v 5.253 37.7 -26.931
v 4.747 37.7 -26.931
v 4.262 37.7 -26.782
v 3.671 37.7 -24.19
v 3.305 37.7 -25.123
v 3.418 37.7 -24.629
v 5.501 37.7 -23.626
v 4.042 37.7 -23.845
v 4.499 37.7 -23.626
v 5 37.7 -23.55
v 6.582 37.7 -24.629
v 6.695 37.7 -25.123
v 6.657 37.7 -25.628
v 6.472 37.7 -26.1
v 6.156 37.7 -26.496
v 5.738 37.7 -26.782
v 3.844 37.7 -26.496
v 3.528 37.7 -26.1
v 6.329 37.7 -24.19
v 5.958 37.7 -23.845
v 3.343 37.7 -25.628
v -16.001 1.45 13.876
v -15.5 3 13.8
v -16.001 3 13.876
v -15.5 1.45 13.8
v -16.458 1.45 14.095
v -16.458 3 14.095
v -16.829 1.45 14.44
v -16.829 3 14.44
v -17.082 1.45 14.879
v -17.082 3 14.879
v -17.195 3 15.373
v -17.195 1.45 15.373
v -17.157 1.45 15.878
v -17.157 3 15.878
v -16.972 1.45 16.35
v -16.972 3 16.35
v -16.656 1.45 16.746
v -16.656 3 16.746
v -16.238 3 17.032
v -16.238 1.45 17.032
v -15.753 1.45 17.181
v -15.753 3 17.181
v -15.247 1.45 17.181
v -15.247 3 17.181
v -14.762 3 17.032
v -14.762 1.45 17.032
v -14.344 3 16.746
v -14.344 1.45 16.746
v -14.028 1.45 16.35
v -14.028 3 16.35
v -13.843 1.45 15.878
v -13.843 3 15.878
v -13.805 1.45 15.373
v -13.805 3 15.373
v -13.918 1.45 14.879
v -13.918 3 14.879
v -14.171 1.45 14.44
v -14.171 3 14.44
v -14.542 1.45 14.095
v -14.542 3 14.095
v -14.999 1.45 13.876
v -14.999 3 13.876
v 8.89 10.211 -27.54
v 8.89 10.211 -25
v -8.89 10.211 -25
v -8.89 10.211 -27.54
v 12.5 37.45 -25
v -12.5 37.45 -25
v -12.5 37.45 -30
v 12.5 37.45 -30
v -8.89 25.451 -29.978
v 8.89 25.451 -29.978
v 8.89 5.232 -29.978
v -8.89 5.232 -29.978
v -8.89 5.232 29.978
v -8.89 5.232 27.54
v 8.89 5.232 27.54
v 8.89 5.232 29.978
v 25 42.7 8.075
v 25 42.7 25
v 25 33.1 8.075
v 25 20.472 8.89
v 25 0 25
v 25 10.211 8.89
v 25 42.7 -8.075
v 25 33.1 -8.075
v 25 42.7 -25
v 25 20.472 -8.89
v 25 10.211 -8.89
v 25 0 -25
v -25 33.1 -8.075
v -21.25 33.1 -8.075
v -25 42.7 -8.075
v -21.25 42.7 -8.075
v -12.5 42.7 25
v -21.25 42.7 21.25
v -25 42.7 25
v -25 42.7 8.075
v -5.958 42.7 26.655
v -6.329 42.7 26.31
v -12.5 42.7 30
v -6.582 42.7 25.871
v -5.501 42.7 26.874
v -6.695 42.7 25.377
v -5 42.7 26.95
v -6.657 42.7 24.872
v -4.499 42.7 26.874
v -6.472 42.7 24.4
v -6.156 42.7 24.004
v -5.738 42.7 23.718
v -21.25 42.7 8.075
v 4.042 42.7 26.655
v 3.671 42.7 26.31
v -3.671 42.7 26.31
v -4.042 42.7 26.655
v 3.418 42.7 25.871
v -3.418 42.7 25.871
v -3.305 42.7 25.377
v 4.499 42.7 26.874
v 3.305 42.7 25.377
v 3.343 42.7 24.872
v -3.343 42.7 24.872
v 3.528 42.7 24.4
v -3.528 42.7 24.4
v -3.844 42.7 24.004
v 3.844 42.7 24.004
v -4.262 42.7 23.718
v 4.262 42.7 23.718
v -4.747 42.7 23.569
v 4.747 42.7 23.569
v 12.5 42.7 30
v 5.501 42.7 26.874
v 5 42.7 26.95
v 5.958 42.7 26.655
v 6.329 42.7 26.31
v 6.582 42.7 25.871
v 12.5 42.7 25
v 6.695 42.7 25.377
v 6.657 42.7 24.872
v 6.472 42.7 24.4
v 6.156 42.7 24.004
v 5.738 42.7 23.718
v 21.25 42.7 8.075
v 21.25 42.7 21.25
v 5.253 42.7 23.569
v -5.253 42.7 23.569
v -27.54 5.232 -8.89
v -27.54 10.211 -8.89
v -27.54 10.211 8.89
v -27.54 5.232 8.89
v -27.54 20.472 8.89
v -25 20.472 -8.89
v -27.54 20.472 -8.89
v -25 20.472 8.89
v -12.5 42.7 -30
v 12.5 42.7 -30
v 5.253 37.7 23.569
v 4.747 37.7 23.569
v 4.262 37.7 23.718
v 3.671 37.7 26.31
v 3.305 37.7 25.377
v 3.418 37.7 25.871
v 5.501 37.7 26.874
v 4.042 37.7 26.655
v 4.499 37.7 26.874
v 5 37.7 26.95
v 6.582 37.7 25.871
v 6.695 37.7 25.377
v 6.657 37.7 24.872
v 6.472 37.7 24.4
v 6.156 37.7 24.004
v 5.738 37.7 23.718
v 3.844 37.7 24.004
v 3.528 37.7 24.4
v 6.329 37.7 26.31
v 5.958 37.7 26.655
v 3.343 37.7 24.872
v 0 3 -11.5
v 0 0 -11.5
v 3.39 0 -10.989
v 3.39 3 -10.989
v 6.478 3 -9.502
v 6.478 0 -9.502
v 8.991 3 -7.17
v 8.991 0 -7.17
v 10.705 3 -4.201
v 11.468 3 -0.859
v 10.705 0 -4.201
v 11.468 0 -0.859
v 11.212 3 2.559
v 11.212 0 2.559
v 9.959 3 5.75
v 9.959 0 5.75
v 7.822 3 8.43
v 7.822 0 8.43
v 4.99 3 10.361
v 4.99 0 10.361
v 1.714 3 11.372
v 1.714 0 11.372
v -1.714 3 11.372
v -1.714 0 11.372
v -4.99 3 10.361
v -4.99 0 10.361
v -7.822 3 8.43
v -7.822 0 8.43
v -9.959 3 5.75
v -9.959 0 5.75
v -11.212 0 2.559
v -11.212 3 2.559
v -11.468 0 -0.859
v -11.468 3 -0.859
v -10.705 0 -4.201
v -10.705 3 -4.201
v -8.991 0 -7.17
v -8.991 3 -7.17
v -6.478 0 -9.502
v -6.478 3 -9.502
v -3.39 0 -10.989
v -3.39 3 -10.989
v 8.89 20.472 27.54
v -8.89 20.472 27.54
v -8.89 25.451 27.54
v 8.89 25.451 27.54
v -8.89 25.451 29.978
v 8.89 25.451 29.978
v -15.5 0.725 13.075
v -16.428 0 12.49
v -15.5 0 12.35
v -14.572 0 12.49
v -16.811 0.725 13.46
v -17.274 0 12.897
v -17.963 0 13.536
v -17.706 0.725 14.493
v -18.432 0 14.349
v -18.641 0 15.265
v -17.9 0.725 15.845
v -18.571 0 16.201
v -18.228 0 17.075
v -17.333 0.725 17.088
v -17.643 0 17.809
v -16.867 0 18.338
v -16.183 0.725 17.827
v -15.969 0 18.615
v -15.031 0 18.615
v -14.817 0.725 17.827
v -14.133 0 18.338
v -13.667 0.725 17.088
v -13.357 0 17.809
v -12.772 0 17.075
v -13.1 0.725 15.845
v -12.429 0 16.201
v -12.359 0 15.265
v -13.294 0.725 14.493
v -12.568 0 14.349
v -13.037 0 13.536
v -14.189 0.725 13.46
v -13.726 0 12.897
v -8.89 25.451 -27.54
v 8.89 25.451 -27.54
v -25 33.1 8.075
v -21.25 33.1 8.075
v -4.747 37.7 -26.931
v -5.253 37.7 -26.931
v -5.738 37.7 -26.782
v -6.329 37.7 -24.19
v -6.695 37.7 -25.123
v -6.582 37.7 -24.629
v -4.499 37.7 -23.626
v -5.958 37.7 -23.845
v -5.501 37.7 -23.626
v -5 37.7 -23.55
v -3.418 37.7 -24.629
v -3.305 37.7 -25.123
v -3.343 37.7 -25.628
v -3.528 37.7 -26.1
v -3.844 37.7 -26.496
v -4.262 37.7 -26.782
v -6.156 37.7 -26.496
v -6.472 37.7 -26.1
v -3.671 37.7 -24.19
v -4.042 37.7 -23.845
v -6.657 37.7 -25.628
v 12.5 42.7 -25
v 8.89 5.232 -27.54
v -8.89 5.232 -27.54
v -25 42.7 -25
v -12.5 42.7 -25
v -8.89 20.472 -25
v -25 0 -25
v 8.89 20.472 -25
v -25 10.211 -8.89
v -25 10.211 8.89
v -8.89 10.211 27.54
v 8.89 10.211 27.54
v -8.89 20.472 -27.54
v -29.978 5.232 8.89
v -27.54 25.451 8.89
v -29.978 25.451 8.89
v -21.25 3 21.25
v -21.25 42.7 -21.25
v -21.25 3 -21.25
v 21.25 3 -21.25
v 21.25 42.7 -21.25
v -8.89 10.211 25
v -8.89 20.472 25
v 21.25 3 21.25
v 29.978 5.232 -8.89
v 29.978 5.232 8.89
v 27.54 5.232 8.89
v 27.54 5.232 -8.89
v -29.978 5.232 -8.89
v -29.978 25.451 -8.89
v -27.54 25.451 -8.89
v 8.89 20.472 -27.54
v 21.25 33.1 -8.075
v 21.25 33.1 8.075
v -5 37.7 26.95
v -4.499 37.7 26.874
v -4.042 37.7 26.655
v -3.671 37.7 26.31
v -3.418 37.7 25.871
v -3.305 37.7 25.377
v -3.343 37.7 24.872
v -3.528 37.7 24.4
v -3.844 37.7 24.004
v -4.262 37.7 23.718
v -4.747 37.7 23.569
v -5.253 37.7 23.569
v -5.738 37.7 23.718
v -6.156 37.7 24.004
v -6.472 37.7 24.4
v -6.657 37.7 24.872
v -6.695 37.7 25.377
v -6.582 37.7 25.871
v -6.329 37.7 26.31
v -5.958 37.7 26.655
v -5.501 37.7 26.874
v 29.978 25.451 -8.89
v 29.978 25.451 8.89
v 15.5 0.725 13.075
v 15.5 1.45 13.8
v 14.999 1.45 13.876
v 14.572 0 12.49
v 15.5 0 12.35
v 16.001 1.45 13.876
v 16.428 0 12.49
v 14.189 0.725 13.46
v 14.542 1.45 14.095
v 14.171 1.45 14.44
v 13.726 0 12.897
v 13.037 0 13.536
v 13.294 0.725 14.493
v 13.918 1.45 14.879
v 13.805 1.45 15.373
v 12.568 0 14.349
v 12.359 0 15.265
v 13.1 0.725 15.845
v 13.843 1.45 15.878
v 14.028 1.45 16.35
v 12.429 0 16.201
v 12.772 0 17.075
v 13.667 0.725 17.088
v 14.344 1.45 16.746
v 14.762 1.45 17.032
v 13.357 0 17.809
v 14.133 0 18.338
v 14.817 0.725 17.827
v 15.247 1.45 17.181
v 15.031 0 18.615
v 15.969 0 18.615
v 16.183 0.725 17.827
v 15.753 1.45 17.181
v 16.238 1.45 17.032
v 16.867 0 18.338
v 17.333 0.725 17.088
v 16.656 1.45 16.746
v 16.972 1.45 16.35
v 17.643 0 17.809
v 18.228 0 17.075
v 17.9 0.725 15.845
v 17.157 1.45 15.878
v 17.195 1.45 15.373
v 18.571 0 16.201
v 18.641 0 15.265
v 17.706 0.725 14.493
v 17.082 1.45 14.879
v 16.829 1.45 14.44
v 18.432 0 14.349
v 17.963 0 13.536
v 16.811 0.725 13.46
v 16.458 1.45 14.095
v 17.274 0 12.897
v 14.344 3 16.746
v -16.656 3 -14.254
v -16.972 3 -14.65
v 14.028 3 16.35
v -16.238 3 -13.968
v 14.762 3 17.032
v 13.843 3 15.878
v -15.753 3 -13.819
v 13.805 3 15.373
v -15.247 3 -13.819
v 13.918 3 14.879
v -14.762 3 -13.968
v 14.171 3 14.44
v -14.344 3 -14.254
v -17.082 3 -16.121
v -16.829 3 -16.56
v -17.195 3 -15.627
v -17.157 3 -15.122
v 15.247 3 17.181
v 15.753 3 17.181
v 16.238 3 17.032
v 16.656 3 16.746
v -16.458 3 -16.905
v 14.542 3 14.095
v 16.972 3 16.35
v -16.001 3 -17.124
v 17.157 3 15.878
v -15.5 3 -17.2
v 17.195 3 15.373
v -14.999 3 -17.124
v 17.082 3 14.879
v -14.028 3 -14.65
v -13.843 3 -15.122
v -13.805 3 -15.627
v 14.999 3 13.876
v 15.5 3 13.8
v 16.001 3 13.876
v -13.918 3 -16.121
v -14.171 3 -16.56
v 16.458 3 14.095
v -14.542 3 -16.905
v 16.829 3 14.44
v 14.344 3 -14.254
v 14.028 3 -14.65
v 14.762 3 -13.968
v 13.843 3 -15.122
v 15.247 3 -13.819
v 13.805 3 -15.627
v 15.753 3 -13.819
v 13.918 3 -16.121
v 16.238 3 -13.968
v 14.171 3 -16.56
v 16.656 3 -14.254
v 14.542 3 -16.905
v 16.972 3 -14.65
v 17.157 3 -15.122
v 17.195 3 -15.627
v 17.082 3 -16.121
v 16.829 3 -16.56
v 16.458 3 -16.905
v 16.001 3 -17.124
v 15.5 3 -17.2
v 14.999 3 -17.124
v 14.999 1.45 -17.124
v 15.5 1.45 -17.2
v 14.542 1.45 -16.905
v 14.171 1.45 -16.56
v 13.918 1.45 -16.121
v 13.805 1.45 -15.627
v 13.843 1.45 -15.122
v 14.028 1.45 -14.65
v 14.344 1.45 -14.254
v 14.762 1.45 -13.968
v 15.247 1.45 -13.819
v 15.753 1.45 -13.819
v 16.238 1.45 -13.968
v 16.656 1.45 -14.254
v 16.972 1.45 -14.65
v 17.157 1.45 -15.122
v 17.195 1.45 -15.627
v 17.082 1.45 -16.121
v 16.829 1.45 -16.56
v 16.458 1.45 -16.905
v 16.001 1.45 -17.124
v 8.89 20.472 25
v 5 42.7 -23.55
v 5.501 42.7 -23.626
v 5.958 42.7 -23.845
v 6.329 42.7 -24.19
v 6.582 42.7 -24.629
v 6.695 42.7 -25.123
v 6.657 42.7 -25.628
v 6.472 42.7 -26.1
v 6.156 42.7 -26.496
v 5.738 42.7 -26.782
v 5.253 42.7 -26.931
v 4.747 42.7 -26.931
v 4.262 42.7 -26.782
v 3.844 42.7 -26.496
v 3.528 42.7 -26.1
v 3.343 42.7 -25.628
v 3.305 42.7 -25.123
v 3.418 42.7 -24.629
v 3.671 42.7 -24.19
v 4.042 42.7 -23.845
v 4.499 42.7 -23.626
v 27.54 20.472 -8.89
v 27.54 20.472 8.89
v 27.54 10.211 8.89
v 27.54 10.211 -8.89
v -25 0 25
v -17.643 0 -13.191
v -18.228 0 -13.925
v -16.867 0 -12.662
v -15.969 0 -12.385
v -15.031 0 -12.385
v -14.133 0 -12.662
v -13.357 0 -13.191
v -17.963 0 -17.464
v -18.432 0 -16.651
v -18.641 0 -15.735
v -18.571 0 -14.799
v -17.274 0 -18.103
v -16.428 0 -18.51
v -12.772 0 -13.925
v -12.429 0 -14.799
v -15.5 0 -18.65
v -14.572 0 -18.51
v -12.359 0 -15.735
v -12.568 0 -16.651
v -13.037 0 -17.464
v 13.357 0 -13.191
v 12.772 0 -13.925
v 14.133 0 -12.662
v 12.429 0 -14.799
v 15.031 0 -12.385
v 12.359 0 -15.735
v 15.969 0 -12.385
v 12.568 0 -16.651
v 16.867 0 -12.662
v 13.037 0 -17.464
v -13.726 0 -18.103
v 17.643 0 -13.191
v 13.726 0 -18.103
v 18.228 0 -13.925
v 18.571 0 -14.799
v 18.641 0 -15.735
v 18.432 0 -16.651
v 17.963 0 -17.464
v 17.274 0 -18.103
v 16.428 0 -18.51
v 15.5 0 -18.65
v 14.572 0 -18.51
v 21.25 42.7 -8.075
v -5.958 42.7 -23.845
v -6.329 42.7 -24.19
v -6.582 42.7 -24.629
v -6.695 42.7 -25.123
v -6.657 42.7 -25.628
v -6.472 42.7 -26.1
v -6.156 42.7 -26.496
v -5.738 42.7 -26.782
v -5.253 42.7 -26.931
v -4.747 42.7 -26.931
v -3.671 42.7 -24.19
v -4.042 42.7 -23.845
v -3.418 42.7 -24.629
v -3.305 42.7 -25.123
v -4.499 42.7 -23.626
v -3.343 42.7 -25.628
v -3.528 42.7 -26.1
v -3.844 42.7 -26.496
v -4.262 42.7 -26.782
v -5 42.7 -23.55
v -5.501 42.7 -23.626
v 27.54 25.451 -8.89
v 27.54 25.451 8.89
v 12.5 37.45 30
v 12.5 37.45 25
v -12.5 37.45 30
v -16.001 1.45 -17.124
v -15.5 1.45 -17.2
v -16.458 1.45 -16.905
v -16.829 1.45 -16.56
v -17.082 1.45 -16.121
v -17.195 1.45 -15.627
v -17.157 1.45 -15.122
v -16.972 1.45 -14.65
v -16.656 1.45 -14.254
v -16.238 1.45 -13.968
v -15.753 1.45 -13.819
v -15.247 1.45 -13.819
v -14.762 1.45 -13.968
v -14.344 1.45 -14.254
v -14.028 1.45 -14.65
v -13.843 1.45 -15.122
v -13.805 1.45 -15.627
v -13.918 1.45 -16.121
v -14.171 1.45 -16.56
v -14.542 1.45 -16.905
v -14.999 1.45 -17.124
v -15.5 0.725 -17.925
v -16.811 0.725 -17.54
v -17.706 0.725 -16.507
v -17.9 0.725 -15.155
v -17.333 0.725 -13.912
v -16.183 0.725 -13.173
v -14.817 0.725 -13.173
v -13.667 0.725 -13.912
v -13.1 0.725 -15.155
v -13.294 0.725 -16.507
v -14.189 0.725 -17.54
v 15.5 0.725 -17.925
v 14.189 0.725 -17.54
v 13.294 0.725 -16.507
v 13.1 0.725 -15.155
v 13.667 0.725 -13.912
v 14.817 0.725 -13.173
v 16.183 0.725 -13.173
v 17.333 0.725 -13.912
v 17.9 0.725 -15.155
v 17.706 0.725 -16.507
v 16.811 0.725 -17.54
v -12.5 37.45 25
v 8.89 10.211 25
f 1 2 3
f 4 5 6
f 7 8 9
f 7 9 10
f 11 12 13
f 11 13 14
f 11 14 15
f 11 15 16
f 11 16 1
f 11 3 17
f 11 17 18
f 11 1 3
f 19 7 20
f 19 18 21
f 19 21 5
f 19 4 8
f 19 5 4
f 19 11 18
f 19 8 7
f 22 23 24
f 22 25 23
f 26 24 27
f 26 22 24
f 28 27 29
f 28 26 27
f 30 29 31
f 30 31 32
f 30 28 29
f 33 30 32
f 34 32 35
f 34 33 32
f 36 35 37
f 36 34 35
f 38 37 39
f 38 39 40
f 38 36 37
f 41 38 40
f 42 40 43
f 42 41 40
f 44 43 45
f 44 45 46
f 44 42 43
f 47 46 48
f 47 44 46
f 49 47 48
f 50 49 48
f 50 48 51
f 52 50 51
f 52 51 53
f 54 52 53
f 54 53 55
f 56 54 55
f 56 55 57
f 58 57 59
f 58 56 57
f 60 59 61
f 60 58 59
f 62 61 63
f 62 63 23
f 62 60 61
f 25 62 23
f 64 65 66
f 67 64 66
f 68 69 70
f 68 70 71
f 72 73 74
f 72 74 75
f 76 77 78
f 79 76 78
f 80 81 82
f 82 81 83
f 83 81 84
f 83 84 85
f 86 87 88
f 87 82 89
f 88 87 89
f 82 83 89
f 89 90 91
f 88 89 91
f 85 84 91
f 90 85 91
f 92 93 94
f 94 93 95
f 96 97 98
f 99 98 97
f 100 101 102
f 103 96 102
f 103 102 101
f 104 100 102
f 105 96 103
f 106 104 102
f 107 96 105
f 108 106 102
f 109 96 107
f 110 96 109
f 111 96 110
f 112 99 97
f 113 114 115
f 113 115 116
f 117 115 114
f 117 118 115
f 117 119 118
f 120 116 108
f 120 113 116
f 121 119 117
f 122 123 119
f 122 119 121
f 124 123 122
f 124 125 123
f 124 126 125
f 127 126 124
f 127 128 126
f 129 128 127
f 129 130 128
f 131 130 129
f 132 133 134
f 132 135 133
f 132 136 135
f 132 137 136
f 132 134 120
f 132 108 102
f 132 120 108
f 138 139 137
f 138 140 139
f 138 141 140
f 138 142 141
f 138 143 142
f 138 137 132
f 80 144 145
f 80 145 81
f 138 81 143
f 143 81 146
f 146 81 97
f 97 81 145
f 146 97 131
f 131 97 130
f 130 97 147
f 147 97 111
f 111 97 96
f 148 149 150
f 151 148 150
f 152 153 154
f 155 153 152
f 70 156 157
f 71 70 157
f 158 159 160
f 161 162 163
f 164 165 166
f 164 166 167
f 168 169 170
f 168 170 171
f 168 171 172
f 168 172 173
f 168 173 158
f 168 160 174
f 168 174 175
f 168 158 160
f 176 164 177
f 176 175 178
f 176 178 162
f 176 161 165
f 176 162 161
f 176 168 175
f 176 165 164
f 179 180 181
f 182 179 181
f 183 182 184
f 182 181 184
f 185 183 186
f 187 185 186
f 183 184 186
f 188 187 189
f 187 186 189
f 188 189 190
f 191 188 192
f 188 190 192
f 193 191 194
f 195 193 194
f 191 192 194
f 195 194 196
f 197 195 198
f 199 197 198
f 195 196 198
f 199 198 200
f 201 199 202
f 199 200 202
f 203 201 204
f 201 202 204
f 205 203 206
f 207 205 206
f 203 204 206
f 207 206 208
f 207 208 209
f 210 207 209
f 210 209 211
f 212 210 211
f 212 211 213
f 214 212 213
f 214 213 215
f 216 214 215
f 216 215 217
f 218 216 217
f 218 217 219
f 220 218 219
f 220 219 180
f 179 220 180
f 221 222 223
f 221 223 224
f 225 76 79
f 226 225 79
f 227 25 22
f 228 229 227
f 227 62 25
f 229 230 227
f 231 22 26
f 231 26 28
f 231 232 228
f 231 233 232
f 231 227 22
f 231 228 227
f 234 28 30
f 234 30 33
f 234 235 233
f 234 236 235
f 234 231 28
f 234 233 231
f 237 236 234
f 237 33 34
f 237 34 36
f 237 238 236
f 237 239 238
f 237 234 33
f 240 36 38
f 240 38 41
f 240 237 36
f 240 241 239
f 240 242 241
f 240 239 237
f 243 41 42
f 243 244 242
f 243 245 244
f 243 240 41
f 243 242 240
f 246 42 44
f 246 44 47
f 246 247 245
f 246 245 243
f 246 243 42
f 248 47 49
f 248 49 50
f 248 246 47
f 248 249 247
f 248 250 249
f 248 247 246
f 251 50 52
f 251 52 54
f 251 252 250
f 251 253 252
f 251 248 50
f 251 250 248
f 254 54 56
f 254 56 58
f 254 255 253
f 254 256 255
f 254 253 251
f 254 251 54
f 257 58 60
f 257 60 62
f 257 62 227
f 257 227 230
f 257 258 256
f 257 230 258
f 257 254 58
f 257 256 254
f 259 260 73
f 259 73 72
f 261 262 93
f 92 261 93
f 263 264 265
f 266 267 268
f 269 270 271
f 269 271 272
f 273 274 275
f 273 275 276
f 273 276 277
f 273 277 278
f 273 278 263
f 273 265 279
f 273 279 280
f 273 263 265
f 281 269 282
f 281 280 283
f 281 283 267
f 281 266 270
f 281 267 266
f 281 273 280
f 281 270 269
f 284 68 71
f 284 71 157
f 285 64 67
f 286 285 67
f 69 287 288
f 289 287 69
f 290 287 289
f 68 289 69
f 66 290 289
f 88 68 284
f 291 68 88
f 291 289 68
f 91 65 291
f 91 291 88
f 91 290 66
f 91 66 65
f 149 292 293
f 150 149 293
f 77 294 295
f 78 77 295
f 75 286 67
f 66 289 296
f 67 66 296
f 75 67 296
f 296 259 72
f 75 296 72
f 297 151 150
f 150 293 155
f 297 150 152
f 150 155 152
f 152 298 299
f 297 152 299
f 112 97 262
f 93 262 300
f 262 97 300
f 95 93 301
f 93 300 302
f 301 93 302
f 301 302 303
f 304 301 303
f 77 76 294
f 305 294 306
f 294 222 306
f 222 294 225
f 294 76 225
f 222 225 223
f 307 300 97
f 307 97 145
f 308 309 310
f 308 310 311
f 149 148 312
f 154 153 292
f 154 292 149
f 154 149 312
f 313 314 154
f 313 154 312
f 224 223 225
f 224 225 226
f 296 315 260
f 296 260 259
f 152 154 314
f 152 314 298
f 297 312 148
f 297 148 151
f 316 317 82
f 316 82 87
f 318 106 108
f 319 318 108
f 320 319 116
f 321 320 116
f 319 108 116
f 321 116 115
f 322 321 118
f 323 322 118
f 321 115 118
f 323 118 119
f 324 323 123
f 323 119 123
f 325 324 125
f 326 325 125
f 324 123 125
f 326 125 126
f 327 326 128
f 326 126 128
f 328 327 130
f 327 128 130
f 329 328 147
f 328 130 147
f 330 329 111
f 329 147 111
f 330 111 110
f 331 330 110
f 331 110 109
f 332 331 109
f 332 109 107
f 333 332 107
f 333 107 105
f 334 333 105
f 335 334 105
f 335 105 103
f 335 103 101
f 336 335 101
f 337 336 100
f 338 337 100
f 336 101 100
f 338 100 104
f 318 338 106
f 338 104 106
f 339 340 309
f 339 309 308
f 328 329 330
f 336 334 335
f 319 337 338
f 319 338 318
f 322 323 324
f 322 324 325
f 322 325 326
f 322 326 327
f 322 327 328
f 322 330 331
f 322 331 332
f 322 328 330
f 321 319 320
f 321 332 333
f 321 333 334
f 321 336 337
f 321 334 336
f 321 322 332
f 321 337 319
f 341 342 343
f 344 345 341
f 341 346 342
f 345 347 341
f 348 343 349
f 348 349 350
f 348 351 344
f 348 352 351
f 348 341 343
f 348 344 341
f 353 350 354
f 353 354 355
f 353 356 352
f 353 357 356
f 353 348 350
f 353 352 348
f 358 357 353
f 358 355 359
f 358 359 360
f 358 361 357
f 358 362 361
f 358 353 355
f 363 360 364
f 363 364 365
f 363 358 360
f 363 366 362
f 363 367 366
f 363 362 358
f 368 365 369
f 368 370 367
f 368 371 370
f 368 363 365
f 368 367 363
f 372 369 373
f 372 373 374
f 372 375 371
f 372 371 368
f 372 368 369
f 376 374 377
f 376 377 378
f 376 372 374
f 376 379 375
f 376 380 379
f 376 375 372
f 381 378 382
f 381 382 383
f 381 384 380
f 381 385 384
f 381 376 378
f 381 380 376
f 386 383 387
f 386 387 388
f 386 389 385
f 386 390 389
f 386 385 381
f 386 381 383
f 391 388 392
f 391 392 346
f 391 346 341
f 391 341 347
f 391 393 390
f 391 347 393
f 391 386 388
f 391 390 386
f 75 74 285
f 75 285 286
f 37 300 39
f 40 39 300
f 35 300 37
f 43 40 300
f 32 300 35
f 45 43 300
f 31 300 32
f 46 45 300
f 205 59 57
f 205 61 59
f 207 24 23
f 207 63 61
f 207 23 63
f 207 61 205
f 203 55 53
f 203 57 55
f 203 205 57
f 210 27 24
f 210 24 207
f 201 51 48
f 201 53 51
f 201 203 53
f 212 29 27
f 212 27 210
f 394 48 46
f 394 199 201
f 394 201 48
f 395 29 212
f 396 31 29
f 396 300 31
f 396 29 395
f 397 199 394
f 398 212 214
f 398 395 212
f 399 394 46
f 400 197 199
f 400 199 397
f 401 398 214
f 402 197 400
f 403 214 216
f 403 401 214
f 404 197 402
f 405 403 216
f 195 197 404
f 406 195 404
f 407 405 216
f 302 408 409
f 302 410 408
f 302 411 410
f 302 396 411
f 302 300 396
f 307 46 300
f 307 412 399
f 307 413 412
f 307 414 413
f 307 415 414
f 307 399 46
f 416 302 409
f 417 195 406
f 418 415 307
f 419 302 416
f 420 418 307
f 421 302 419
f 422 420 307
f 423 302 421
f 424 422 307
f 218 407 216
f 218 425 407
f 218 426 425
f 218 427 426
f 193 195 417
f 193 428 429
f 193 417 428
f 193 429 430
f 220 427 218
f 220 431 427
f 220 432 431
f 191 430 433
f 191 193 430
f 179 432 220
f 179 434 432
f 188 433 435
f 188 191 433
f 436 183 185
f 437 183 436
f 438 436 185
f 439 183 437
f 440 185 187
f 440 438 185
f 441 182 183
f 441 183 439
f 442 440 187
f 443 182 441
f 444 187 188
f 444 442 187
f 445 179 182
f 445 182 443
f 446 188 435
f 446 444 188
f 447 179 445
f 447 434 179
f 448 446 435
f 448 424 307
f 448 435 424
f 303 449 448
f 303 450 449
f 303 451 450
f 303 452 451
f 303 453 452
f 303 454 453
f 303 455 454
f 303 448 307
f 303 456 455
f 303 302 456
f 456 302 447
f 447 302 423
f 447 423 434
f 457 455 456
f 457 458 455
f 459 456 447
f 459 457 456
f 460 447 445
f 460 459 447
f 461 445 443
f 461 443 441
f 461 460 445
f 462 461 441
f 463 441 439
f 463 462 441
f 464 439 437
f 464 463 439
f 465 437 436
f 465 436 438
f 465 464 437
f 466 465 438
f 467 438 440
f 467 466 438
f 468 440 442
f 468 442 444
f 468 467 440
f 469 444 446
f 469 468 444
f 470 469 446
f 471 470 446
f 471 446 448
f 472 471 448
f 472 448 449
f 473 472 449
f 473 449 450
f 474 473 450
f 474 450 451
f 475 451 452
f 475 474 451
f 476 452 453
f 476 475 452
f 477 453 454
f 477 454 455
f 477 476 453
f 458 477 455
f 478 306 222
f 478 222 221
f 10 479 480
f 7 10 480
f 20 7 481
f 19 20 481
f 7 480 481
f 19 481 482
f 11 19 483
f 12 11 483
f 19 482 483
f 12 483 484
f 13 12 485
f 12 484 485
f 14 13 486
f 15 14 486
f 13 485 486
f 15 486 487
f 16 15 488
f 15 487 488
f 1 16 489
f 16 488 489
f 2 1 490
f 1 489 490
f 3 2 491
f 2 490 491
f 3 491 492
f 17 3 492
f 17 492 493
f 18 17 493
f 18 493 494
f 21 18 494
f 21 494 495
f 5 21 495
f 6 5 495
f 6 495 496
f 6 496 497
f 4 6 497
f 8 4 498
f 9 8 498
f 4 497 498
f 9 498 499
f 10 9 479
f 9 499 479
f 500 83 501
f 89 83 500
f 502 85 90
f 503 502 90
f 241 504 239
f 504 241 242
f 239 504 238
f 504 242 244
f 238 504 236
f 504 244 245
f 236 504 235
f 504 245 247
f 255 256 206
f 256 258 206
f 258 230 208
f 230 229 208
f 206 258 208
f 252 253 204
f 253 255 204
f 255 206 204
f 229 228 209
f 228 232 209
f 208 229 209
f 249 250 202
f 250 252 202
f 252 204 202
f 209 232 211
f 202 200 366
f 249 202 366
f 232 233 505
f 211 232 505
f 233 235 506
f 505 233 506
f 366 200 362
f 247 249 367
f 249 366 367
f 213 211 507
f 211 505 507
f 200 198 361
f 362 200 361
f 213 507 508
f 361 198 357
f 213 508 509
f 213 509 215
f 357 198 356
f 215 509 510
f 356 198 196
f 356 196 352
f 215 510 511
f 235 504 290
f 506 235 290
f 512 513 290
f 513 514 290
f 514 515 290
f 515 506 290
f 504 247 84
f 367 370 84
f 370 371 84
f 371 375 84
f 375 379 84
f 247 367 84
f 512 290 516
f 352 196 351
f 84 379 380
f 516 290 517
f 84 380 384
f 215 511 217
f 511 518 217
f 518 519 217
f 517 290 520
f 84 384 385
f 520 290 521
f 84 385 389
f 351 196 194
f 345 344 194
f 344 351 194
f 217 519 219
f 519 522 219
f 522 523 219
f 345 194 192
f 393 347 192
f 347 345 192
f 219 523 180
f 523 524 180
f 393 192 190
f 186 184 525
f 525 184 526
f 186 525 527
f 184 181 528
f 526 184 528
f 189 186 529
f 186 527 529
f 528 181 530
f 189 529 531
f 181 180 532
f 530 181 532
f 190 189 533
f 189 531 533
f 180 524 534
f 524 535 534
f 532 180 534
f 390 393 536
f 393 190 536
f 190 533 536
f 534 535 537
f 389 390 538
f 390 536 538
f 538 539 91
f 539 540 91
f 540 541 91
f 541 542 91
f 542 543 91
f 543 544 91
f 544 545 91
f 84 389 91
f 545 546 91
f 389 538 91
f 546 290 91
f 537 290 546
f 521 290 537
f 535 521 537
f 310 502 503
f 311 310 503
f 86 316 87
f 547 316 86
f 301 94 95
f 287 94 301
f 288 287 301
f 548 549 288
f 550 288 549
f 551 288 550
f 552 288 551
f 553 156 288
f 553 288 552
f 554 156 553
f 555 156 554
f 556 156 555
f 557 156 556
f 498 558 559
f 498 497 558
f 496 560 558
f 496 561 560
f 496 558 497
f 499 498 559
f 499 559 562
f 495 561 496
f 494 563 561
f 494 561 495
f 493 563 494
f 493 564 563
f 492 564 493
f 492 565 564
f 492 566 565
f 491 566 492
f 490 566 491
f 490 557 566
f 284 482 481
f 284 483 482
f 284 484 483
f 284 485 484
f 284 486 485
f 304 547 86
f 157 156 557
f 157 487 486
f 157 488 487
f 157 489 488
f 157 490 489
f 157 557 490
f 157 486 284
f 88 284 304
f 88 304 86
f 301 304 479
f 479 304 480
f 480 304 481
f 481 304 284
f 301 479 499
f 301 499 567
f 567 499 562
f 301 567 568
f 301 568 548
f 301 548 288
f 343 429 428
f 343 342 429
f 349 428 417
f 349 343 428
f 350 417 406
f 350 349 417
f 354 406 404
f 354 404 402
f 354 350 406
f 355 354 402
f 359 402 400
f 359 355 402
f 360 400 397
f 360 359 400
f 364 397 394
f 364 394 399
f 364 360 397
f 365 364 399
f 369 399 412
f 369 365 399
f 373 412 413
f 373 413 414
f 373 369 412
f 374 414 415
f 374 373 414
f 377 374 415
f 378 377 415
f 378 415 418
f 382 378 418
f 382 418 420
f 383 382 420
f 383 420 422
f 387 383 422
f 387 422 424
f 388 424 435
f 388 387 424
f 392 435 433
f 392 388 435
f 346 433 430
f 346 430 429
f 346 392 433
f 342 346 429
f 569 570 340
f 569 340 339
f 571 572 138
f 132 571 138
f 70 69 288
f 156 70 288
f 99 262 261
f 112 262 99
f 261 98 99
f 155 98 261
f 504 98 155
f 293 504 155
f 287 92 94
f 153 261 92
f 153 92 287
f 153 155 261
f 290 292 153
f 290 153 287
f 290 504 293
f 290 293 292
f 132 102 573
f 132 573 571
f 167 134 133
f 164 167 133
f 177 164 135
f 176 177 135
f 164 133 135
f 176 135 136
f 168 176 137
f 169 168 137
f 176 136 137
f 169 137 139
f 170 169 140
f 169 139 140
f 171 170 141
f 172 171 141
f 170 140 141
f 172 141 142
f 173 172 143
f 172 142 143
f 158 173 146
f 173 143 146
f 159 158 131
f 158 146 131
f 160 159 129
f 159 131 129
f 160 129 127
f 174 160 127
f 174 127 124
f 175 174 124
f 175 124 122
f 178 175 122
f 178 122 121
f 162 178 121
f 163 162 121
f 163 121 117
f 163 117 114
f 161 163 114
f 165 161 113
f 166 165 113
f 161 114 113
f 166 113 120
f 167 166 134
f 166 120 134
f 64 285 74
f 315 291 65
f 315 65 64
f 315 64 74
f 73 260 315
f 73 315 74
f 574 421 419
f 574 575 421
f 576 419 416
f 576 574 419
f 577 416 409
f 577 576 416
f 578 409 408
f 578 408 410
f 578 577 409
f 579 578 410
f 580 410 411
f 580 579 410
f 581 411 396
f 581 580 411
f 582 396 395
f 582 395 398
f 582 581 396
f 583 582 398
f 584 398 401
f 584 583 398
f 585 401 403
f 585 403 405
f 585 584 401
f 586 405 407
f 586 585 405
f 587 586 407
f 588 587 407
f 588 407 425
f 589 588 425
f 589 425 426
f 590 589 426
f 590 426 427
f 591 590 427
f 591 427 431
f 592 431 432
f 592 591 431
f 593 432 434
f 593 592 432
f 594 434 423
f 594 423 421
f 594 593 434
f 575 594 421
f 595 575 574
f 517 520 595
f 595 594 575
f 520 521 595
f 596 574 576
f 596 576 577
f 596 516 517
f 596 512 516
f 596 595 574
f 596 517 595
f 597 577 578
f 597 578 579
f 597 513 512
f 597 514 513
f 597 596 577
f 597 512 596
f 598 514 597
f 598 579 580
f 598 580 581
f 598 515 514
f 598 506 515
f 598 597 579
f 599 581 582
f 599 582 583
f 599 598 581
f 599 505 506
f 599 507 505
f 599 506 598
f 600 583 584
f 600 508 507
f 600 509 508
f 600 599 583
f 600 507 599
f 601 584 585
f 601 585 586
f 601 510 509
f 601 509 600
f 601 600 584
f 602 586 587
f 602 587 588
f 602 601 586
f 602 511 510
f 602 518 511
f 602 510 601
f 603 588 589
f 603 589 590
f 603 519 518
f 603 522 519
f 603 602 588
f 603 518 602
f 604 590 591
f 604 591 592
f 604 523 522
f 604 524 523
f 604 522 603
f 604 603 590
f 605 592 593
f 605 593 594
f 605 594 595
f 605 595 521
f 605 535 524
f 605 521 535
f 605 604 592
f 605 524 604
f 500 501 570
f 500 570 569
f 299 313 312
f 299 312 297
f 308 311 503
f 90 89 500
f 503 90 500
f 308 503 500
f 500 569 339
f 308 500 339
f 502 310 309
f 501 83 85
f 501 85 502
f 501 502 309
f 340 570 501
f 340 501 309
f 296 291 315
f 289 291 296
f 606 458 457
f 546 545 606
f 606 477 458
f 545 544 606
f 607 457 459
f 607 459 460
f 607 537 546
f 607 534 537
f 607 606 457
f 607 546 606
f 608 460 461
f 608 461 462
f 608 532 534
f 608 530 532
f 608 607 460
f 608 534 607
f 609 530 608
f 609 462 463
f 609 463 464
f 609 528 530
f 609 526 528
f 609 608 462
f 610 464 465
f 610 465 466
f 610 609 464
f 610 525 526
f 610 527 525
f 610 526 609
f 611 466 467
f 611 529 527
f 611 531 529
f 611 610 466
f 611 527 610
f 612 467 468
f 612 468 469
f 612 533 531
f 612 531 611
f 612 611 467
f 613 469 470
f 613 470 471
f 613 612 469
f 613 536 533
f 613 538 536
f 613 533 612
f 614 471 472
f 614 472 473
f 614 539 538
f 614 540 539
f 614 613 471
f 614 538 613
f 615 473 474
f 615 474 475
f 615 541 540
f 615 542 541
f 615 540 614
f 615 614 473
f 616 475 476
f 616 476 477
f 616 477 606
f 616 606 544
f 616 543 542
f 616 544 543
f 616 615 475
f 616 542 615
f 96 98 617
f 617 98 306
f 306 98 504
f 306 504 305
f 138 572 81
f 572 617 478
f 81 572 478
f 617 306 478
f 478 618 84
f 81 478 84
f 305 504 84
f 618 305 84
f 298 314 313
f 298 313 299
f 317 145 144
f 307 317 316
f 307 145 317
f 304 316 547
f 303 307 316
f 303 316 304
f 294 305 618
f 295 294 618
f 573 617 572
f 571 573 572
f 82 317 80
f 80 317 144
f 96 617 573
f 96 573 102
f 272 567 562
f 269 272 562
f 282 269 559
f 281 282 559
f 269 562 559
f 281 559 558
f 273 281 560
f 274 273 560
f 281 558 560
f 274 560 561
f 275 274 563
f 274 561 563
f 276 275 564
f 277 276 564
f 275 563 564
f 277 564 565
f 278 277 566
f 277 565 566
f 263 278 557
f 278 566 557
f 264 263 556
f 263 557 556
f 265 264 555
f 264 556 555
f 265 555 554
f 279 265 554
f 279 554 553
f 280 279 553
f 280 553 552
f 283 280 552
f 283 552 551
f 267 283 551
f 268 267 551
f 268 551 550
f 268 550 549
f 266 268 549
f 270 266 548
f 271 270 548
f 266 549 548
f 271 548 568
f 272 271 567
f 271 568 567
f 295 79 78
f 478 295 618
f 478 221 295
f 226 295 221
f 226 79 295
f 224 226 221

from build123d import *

# Parameters (mm, degrees)
SKETCH1_W                                    = 50
SKETCH1_H                                    = 50
BOSS_EXTRUDE1_DEPTH                          = 3
SKETCH3_W                                    = 50
SKETCH3_H                                    = 50
SKETCH3_W_2                                  = 42.5
SKETCH3_H_2                                  = 42.5
BOSS_EXTRUDE2_DEPTH                          = 39.7
CUT_EXTRUDE5_START                           = -5
SKETCH19_W                                   = 16.15
SKETCH19_H                                   = 9.6
CUT_EXTRUDE5_DEPTH                           = 76.344082907
SKETCH33_W                                   = 25
SKETCH33_H                                   = 5.25
BOSS_EXTRUDE14_DEPTH                         = 5
SKETCH21_R                                   = 1.7
CUT_EXTRUDE6_DEPTH                           = 5
CUT_EXTRUDE8_REACH                           = 59.864
SKETCH27_R                                   = 11.5
CSK_FOR_M3_COUNTERSUNK_FLAT_HEAD_SCR_2_COUNT = 2
CSK_FOR_M3_COUNTERSUNK_FLAT_HEAD_SCR_2_PITCH = 31
CSK_FOR_M3_COUNTERSUNK_FLAT_HEAD_SCR_3_COUNT = 2
CSK_FOR_M3_COUNTERSUNK_FLAT_HEAD_SCR_3_PITCH = 43.840620434
CSK_FOR_M3_COUNTERSUNK_FLAT_HEAD_SCR_4_COUNT = 2
CSK_FOR_M3_COUNTERSUNK_FLAT_HEAD_SCR_4_PITCH = 31
SKETCH34_W                                   = 17.78
SKETCH34_H                                   = 10.2616
BOSS_EXTRUDE15_DEPTH                         = 4.9784
SKETCH35_W                                   = 17.78
SKETCH35_H                                   = 2.4384
BOSS_EXTRUDE16_DEPTH                         = 4.9784
CIRPATTERN1_COUNT                            = 4
CIRPATTERN1_COPY_1_SKETCH_W                  = 17.78
CIRPATTERN1_COPY_1_SKETCH_H                  = 2.4384
CIRPATTERN1_COPY_1_DEPTH                     = 4.9784
CIRPATTERN1_COPY_2_SKETCH_W                  = 17.78
CIRPATTERN1_COPY_2_SKETCH_H                  = 2.4384
CIRPATTERN1_COPY_2_DEPTH                     = 4.9784
CIRPATTERN1_COPY_3_SKETCH_W                  = 17.78
CIRPATTERN1_COPY_3_SKETCH_H                  = 2.4384
CIRPATTERN1_COPY_3_DEPTH                     = 4.9784


with BuildPart() as part:
    # Sketch1 → Boss-Extrude1 (new body)
    with BuildSketch(Plane(origin=(0, 0, 0), x_dir=(1, 0, 0), z_dir=(0, 1, 0))):
        Rectangle(SKETCH1_W, SKETCH1_H)
    extrude(amount=BOSS_EXTRUDE1_DEPTH)

    # Sketch3 → Boss-Extrude2 (add)
    with BuildSketch(Plane(origin=(0, 3, 0), x_dir=(1, 0, 0), z_dir=(0, 1, 0))):
        Rectangle(SKETCH3_W, SKETCH3_H)
        Rectangle(SKETCH3_W_2, SKETCH3_H_2, mode=Mode.SUBTRACT)
    extrude(amount=BOSS_EXTRUDE2_DEPTH)

    # Sketch19 → Cut-Extrude5 (cut)
    with BuildSketch(Plane(origin=(25, 0, 0), x_dir=(0, 0, -1), z_dir=(1, 0, 0)).offset(CUT_EXTRUDE5_START)):
        with Locations((0, 37.9)):
            Rectangle(SKETCH19_W, SKETCH19_H)
    cut_extrude5 = extrude(amount=CUT_EXTRUDE5_DEPTH, mode=Mode.SUBTRACT)

    # Sketch33 → Boss-Extrude14 (add)
    with BuildSketch(Plane.XY.offset(25)):
        with Locations((0, 40.075)):
            Rectangle(SKETCH33_W, SKETCH33_H)
    boss_extrude14 = extrude(amount=BOSS_EXTRUDE14_DEPTH)

    # Mirror7: Boss-Extrude14 across plane
    add(boss_extrude14.mirror(Plane.XY))

    # Sketch21 → Cut-Extrude6 (cut)
    with BuildSketch(Plane(origin=(0, 42.7, 0), x_dir=(1, 0, 0), z_dir=(0, 1, 0))):
        with Locations(Location((5, -25.25, 0), (0, 0, 270))):
            Circle(SKETCH21_R)
        with Locations(Location((-5, 25.25, 0), (0, 0, 270))):
            Circle(SKETCH21_R)
        with Locations(Location((5, 25.25, 0), (0, 0, 270))):
            Circle(SKETCH21_R)
        with Locations(Location((-5, -25.25, 0), (0, 0, 270))):
            Circle(SKETCH21_R)
    extrude(amount=-CUT_EXTRUDE6_DEPTH, mode=Mode.SUBTRACT)

    # Sketch27 → Cut-Extrude8 (cut, up to next)
    with BuildSketch(Plane.XZ, mode=Mode.PRIVATE) as cut_extrude8_sk1:
        with Locations(Location((0, 0, 0), (0, 0, 270))):
            Circle(SKETCH27_R)
    cut_extrude8_tool1 = extrude(cut_extrude8_sk1.sketch, amount=-CUT_EXTRUDE8_REACH, mode=Mode.PRIVATE) & part.part
    add(cut_extrude8_tool1.solids().sort_by_distance((0, 0, 0))[0], mode=Mode.SUBTRACT)

    # Sketch30 → CSK for M3 Countersunk Flat Head Screw1 (revolve, cut)
    with BuildSketch(Plane(origin=(-15.5, 0, 15.5), x_dir=(0, 0, -1), z_dir=(1, 0, 0))):
        Polygon((0, 0), (0, 3), (1.7, 3), (1.7, 1.45), (3.15, 0), align=None)
    csk_for_m3_countersunk_flat_head_screw1 = revolve(axis=Axis((-15.5, -6.35, 15.5), (0, 1, 0)), mode=Mode.SUBTRACT)

    # CSK for M3 Countersunk Flat Head Scr 2: CSK for M3 Countersunk Flat Head Screw1 ×2
    with Locations(*[(i * CSK_FOR_M3_COUNTERSUNK_FLAT_HEAD_SCR_2_PITCH, 0, 0) for i in range(1, CSK_FOR_M3_COUNTERSUNK_FLAT_HEAD_SCR_2_COUNT)]):
        add(csk_for_m3_countersunk_flat_head_screw1, mode=Mode.SUBTRACT)

    # CSK for M3 Countersunk Flat Head Scr 3: CSK for M3 Countersunk Flat Head Screw1 ×2
    with Locations(*[Vector(0.7071067811865475, 0, -0.7071067811865476) * (i * CSK_FOR_M3_COUNTERSUNK_FLAT_HEAD_SCR_3_PITCH) for i in range(1, CSK_FOR_M3_COUNTERSUNK_FLAT_HEAD_SCR_3_COUNT)]):
        add(csk_for_m3_countersunk_flat_head_screw1, mode=Mode.SUBTRACT)

    # CSK for M3 Countersunk Flat Head Scr 4: CSK for M3 Countersunk Flat Head Screw1 ×2
    with Locations(*[(0, 0, -i * CSK_FOR_M3_COUNTERSUNK_FLAT_HEAD_SCR_4_PITCH) for i in range(1, CSK_FOR_M3_COUNTERSUNK_FLAT_HEAD_SCR_4_COUNT)]):
        add(csk_for_m3_countersunk_flat_head_screw1, mode=Mode.SUBTRACT)

    # Mirror4: Cut-Extrude5 across plane
    add(cut_extrude5.mirror(Plane(origin=(0, 0, 0), x_dir=(0, 0, 1), z_dir=(1, 0, 0))), mode=Mode.SUBTRACT)

    # Sketch34 → Boss-Extrude15 (add)
    with BuildSketch(Plane.XY.offset(25)):
        with Locations((0, 15.3416)):
            Rectangle(SKETCH34_W, SKETCH34_H)
    boss_extrude15 = extrude(amount=BOSS_EXTRUDE15_DEPTH)

    # Sketch35 → Boss-Extrude16 (add)
    with BuildSketch(Plane(origin=(0, 20.4724, 0), x_dir=(1, 0, 0), z_dir=(0, 1, 0))):
        with Locations((0, -28.7592)):
            Rectangle(SKETCH35_W, SKETCH35_H)
    boss_extrude16 = extrude(amount=BOSS_EXTRUDE16_DEPTH)

    # Mirror8: Boss-Extrude16 across plane
    add(boss_extrude16.mirror(Plane.ZX.offset(15.3416)))

    # CirPattern1: Boss-Extrude15, Boss-Extrude16 ×4 about axis
    cirpattern1_axis = Axis((0, 0, 0), (0, 1, 0))
    add([boss_extrude15.rotate(cirpattern1_axis, i * 360 / CIRPATTERN1_COUNT) for i in range(1, CIRPATTERN1_COUNT)])
    add([boss_extrude16.rotate(cirpattern1_axis, i * 360 / CIRPATTERN1_COUNT) for i in range(1, CIRPATTERN1_COUNT)])

    # CirPattern1 copy 1 sketch → CirPattern1 copy 1 (add)
    with BuildSketch(Plane(origin=(0, 10.2108, 0), x_dir=(0, 0, -1), z_dir=(0, -1, 0))):
        with Locations((0, 28.7592)):
            Rectangle(CIRPATTERN1_COPY_1_SKETCH_W, CIRPATTERN1_COPY_1_SKETCH_H)
    extrude(amount=CIRPATTERN1_COPY_1_DEPTH)

    # CirPattern1 copy 2 sketch → CirPattern1 copy 2 (add)
    with BuildSketch(Plane(origin=(0, 10.2108, 0), x_dir=(-1, 0, 0), z_dir=(0, -1, 0))):
        with Locations((0, 28.7592)):
            Rectangle(CIRPATTERN1_COPY_2_SKETCH_W, CIRPATTERN1_COPY_2_SKETCH_H)
    extrude(amount=CIRPATTERN1_COPY_2_DEPTH)

    # CirPattern1 copy 3 sketch → CirPattern1 copy 3 (add)
    with BuildSketch(Plane(origin=(0, 10.2108, 0), x_dir=(0, 0, 1), z_dir=(0, -1, 0))):
        with Locations((0, 28.7592)):
            Rectangle(CIRPATTERN1_COPY_3_SKETCH_W, CIRPATTERN1_COPY_3_SKETCH_H)
    extrude(amount=CIRPATTERN1_COPY_3_DEPTH)


solid = part.part
